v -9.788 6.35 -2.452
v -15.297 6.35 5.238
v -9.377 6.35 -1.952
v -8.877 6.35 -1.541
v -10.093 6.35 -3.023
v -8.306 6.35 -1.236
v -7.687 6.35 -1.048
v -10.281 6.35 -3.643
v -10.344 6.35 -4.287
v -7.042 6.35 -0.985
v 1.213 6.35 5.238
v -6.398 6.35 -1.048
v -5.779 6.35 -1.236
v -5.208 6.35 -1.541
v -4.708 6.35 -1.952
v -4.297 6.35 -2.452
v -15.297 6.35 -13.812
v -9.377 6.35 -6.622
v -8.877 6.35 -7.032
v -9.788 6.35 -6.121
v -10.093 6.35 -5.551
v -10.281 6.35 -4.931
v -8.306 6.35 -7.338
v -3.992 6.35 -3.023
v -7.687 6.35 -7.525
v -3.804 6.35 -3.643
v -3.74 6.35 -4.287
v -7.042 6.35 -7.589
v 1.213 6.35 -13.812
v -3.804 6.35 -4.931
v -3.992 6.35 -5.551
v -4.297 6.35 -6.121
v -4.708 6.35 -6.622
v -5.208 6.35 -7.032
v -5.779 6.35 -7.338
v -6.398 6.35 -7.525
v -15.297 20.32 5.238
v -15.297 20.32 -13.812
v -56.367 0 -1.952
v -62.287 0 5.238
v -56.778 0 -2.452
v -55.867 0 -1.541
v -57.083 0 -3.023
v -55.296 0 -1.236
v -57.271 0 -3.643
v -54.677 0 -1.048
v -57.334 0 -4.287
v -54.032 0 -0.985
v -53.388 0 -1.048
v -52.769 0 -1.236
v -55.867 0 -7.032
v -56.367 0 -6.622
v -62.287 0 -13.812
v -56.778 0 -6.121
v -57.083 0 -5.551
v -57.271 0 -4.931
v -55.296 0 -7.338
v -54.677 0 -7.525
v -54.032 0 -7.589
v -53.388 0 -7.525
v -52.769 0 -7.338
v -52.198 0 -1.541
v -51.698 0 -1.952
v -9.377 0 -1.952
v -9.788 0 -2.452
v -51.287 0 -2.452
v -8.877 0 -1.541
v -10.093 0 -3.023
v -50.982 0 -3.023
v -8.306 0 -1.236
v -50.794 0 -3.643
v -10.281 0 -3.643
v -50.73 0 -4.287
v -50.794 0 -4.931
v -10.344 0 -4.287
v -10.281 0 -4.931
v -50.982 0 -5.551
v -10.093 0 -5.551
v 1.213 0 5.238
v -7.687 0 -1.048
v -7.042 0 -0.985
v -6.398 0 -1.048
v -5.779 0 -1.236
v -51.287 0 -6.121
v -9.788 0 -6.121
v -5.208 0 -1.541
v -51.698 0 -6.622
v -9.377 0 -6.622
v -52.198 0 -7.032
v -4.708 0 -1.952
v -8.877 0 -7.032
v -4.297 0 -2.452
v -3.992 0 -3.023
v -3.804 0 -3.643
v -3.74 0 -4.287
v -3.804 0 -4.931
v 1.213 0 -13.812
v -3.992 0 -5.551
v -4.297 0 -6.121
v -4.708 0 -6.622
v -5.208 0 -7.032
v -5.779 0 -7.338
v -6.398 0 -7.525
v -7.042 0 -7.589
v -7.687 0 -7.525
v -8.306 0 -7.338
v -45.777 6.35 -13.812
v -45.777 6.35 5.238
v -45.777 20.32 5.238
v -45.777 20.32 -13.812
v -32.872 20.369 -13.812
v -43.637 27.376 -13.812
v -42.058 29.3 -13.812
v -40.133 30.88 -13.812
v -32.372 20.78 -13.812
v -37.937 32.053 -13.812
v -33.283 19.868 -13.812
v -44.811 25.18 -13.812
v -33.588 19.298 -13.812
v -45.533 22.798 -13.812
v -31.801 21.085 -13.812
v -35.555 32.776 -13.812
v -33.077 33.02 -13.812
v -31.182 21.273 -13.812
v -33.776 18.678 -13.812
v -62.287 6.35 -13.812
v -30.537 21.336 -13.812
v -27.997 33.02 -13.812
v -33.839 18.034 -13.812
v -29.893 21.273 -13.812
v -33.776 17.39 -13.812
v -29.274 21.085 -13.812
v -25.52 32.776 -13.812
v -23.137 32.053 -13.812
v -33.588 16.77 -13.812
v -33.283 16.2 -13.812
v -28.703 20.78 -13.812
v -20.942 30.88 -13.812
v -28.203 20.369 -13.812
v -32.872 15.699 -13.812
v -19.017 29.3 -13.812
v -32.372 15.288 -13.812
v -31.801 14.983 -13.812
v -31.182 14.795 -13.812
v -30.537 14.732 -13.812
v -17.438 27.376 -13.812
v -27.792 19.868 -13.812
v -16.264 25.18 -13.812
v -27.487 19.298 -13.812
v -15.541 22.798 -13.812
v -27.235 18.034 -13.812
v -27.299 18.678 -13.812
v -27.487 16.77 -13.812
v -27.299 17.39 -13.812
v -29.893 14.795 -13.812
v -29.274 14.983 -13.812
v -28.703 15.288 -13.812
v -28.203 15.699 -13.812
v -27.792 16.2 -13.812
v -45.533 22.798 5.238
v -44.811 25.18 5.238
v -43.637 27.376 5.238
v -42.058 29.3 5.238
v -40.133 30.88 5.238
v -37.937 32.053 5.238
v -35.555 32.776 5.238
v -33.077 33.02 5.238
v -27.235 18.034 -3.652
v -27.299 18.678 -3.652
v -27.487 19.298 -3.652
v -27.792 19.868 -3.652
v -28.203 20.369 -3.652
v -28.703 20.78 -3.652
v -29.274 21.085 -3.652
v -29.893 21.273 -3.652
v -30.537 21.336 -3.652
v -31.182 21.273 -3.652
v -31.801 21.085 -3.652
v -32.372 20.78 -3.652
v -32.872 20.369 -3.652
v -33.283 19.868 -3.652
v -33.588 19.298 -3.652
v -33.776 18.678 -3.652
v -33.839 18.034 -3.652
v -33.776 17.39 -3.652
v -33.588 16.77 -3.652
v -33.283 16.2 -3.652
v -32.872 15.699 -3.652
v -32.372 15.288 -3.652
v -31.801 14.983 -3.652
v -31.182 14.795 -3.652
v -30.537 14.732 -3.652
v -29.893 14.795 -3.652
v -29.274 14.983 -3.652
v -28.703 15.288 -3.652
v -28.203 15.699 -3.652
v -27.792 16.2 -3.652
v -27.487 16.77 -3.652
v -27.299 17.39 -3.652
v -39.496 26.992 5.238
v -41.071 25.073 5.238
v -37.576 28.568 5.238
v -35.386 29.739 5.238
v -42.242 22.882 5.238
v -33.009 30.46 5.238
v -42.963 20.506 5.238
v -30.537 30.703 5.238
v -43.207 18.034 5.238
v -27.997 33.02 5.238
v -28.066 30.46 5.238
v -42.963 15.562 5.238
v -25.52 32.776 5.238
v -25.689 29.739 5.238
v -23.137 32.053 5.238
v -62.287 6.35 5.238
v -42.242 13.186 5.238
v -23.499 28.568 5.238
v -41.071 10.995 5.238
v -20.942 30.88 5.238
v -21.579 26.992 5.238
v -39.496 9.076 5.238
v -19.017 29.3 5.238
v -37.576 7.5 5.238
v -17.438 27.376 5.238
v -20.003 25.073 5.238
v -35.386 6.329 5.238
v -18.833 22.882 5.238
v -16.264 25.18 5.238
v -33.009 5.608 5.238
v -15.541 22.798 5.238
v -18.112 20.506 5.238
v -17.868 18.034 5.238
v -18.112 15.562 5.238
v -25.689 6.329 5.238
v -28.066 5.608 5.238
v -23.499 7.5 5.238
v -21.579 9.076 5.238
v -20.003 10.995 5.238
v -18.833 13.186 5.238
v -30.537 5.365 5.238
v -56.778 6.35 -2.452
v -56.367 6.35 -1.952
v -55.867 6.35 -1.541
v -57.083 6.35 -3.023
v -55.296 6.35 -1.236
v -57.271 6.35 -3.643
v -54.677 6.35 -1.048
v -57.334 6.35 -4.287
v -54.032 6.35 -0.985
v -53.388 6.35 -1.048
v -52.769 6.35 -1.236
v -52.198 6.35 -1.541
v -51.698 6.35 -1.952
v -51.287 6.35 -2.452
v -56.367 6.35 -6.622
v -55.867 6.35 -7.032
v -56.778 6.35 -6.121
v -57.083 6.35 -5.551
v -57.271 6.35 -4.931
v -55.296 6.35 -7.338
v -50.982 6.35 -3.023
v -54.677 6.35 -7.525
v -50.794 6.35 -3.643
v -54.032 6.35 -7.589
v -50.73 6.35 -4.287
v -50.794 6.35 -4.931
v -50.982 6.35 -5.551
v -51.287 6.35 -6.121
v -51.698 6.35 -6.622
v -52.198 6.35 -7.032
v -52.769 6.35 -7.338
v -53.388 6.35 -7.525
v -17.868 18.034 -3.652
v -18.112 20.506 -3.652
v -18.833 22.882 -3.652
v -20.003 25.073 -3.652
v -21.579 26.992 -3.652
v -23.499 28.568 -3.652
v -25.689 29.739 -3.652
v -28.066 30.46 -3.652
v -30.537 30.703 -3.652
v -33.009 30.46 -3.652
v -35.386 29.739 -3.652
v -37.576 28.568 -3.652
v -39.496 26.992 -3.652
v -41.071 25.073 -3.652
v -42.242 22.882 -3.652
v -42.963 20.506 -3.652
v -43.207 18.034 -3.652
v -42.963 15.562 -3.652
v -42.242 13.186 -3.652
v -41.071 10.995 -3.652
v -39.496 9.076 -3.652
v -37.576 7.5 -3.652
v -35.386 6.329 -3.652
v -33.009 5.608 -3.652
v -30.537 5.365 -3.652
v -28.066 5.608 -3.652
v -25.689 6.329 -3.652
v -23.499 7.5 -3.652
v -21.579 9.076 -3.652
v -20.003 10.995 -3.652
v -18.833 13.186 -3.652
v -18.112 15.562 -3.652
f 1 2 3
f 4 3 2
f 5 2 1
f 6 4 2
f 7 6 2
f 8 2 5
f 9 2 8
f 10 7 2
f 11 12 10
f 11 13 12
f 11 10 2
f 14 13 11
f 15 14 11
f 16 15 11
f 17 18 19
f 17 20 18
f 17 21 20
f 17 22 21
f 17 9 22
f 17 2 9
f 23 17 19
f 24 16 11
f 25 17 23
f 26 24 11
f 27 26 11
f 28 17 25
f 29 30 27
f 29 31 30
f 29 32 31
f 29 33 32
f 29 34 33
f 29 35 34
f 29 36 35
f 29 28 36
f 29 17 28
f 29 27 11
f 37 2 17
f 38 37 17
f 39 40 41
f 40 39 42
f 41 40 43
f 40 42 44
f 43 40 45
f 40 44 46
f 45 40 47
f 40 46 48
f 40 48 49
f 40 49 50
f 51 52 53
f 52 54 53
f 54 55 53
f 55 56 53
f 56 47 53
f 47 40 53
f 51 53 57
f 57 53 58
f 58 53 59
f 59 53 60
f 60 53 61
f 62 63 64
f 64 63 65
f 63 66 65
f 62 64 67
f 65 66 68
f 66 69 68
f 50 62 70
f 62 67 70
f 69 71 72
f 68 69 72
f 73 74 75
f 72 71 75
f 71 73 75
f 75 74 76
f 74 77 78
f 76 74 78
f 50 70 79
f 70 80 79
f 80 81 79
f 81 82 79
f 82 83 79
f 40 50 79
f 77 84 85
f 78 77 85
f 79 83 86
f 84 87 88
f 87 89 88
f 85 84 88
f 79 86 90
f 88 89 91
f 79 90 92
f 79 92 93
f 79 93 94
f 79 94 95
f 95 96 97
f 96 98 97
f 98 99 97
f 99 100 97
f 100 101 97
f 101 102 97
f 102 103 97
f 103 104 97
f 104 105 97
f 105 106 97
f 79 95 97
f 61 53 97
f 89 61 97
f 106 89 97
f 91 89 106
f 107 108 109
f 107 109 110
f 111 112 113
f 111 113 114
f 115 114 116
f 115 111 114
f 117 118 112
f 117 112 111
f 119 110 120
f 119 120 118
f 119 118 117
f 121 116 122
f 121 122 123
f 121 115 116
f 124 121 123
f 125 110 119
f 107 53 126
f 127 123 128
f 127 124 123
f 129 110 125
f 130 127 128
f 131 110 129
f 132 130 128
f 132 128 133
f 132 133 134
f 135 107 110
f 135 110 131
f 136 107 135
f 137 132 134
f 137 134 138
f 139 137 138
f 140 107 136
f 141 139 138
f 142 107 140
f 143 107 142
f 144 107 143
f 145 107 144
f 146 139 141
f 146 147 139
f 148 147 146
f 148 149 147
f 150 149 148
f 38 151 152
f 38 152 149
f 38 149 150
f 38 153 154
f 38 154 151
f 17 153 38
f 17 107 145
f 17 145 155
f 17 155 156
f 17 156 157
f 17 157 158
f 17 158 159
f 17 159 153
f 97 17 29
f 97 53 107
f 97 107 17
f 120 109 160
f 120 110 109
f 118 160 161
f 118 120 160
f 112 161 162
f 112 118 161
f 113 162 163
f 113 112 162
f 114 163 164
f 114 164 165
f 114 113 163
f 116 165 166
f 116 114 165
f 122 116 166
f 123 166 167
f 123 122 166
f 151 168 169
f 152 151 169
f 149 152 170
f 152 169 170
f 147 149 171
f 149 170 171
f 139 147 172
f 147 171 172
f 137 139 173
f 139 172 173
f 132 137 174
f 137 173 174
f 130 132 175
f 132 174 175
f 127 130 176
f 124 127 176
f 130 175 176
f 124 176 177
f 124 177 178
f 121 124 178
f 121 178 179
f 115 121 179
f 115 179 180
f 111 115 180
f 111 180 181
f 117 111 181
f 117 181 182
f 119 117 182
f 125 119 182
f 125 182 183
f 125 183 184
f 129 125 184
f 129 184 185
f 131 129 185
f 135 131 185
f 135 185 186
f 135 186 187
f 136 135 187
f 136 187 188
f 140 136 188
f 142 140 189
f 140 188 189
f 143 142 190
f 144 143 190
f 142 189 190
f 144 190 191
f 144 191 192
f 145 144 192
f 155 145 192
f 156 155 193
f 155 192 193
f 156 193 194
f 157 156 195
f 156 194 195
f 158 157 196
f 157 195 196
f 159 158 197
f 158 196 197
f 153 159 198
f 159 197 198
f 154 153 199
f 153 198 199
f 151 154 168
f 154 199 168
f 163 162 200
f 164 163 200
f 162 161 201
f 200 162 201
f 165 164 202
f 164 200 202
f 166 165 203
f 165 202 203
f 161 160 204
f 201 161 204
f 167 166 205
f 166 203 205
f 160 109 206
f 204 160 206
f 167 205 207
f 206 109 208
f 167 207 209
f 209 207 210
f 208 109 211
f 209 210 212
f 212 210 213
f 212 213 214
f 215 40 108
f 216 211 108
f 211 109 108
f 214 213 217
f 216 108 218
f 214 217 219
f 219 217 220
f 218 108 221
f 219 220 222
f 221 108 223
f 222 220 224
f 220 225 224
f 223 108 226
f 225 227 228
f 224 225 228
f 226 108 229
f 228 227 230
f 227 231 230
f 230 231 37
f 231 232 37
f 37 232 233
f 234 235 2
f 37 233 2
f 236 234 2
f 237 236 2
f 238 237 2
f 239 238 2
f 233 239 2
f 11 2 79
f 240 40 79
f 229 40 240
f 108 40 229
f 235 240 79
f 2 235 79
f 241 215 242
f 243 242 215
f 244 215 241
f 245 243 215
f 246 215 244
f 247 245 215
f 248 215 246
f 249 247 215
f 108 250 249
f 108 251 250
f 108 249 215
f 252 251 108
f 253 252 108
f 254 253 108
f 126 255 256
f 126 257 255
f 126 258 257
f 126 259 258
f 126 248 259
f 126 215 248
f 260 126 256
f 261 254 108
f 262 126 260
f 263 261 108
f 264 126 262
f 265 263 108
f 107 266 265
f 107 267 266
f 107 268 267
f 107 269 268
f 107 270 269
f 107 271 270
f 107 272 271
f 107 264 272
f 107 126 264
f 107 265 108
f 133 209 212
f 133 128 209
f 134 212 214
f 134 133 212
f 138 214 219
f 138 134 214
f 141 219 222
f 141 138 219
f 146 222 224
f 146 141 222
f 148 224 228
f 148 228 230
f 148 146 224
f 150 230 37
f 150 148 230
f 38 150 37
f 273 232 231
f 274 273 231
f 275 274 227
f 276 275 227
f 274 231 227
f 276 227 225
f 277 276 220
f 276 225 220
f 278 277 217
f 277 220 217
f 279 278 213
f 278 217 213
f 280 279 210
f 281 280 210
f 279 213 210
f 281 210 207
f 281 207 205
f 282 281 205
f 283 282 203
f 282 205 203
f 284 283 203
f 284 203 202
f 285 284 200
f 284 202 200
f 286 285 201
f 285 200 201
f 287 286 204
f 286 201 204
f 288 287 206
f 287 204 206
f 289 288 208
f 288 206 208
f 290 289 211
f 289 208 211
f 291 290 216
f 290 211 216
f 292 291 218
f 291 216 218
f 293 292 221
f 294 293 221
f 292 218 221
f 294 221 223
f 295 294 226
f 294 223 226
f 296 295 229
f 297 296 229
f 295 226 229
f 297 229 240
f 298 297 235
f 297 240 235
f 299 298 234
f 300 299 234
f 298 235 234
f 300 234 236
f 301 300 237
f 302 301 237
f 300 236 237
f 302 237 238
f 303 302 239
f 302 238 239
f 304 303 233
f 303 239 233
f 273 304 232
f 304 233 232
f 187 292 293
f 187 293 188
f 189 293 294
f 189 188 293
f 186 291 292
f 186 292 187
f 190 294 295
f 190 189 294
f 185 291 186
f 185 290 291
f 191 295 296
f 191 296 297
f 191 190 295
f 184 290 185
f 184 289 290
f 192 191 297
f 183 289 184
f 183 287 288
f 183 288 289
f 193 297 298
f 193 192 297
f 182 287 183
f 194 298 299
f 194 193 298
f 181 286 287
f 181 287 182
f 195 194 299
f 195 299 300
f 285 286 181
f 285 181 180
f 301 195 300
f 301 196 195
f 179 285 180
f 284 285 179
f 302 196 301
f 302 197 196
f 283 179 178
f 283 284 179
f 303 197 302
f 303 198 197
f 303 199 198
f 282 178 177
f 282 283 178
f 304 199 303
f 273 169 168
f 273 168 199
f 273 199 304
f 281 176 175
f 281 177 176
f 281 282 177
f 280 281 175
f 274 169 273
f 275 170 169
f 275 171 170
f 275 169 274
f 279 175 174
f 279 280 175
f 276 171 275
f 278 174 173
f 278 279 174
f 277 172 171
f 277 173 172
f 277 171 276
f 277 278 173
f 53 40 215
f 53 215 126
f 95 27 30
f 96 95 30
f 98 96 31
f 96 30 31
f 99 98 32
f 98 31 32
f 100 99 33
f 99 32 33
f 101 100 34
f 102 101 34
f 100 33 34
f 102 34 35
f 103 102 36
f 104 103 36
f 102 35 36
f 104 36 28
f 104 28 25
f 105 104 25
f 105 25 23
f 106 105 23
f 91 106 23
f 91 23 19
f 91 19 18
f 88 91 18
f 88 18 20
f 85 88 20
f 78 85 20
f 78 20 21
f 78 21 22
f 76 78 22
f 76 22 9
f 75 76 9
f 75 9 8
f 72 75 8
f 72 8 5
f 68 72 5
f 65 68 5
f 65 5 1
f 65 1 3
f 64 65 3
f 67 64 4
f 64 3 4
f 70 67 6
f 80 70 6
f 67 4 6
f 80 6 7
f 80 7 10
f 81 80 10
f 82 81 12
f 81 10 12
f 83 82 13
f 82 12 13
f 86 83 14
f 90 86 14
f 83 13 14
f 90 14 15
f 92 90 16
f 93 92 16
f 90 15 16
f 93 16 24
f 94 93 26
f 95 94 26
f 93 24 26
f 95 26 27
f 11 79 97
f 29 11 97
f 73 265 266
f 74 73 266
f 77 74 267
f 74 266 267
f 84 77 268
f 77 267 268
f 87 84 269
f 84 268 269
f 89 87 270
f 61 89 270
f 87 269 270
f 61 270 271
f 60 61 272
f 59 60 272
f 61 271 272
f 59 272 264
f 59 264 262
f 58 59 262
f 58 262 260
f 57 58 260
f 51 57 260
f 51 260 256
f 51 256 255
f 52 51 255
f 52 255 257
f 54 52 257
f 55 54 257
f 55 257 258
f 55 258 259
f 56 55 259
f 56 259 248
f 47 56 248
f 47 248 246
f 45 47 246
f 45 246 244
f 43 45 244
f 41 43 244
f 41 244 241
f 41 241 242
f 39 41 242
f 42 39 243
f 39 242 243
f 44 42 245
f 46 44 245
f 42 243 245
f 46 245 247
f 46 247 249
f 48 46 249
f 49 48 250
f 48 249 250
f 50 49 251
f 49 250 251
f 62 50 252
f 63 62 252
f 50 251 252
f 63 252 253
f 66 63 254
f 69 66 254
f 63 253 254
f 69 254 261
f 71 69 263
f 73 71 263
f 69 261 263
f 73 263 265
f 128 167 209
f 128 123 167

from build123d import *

# Parameters (mm, degrees)
SKETCH1_W           = 63.5
SKETCH1_H           = 19.05
BOSS_EXTRUDE1_DEPTH = 6.35
SKETCH2_W           = 30.48
SKETCH2_H           = 19.05
BOSS_EXTRUDE2_DEPTH = 26.67
CUT_EXTRUDE1_REACH  = 8.35
SKETCH3_R           = 3.302
SKETCH4_R           = 12.669104941
CUT_EXTRUDE2_DEPTH  = 8.89
SKETCH5_R           = 3.302
CUT_EXTRUDE3_DEPTH  = 20.05
FILLET1_R           = 12.7


with BuildPart() as part:
    # Sketch1 → Boss-Extrude1 (new body)
    with BuildSketch(Plane(origin=(0, 0, 0), x_dir=(1, 0, 0), z_dir=(0, 1, 0))):
        with Locations((-30.537406907, 4.286893637)):
            Rectangle(SKETCH1_W, SKETCH1_H)
    extrude(amount=BOSS_EXTRUDE1_DEPTH)

    # Sketch2 → Boss-Extrude2 (add)
    with BuildSketch(Plane(origin=(0, 6.35, 0), x_dir=(1, 0, 0), z_dir=(0, 1, 0))):
        with Locations((-30.537406907, 4.286893637)):
            Rectangle(SKETCH2_W, SKETCH2_H)
    extrude(amount=BOSS_EXTRUDE2_DEPTH)

    # Sketch3 → Cut-Extrude1 (cut, up to next)
    with BuildSketch(Plane(origin=(0, 6.35, 0), x_dir=(1, 0, 0), z_dir=(0, 1, 0)), mode=Mode.PRIVATE) as cut_extrude1_sk1:
        with Locations((-54.032406907, 4.286893637)):
            Circle(SKETCH3_R)
    cut_extrude1_tool1 = extrude(cut_extrude1_sk1.sketch, amount=-CUT_EXTRUDE1_REACH, mode=Mode.PRIVATE) & part.part
    add(cut_extrude1_tool1.solids().sort_by_distance((-54.032407, 6.35, -4.286894))[0], mode=Mode.SUBTRACT)
    # Sketch3 → Cut-Extrude1 (cut, up to next)
    with BuildSketch(Plane(origin=(0, 6.35, 0), x_dir=(1, 0, 0), z_dir=(0, 1, 0)), mode=Mode.PRIVATE) as cut_extrude1_sk2:
        with Locations((-7.042406907, 4.286893637)):
            Circle(SKETCH3_R)
    cut_extrude1_tool2 = extrude(cut_extrude1_sk2.sketch, amount=-CUT_EXTRUDE1_REACH, mode=Mode.PRIVATE) & part.part
    add(cut_extrude1_tool2.solids().sort_by_distance((-7.042407, 6.35, -4.286894))[0], mode=Mode.SUBTRACT)

    # Sketch4 → Cut-Extrude2 (cut)
    with BuildSketch(Plane.XY.offset(5.238106363)):
        with Locations((-30.537406907, 18.034)):
            Circle(SKETCH4_R)
    extrude(amount=-CUT_EXTRUDE2_DEPTH, mode=Mode.SUBTRACT)

    # Sketch5 → Cut-Extrude3 (cut, through all)
    with BuildSketch(Plane.XY.offset(5.238106363)):
        with Locations((-30.537406907, 18.034)):
            Circle(SKETCH5_R)
    extrude(amount=-CUT_EXTRUDE3_DEPTH, mode=Mode.SUBTRACT)

    # Fillet1
    fillet1_edges = [part.edges().sort_by_distance(p)[0] for p in [
        (-45.777406907, 33.02, -4.286893637),
        (-15.297406907, 33.02, -4.286893637),
    ]]
    fillet(fillet1_edges, radius=FILLET1_R)


solid = part.part
